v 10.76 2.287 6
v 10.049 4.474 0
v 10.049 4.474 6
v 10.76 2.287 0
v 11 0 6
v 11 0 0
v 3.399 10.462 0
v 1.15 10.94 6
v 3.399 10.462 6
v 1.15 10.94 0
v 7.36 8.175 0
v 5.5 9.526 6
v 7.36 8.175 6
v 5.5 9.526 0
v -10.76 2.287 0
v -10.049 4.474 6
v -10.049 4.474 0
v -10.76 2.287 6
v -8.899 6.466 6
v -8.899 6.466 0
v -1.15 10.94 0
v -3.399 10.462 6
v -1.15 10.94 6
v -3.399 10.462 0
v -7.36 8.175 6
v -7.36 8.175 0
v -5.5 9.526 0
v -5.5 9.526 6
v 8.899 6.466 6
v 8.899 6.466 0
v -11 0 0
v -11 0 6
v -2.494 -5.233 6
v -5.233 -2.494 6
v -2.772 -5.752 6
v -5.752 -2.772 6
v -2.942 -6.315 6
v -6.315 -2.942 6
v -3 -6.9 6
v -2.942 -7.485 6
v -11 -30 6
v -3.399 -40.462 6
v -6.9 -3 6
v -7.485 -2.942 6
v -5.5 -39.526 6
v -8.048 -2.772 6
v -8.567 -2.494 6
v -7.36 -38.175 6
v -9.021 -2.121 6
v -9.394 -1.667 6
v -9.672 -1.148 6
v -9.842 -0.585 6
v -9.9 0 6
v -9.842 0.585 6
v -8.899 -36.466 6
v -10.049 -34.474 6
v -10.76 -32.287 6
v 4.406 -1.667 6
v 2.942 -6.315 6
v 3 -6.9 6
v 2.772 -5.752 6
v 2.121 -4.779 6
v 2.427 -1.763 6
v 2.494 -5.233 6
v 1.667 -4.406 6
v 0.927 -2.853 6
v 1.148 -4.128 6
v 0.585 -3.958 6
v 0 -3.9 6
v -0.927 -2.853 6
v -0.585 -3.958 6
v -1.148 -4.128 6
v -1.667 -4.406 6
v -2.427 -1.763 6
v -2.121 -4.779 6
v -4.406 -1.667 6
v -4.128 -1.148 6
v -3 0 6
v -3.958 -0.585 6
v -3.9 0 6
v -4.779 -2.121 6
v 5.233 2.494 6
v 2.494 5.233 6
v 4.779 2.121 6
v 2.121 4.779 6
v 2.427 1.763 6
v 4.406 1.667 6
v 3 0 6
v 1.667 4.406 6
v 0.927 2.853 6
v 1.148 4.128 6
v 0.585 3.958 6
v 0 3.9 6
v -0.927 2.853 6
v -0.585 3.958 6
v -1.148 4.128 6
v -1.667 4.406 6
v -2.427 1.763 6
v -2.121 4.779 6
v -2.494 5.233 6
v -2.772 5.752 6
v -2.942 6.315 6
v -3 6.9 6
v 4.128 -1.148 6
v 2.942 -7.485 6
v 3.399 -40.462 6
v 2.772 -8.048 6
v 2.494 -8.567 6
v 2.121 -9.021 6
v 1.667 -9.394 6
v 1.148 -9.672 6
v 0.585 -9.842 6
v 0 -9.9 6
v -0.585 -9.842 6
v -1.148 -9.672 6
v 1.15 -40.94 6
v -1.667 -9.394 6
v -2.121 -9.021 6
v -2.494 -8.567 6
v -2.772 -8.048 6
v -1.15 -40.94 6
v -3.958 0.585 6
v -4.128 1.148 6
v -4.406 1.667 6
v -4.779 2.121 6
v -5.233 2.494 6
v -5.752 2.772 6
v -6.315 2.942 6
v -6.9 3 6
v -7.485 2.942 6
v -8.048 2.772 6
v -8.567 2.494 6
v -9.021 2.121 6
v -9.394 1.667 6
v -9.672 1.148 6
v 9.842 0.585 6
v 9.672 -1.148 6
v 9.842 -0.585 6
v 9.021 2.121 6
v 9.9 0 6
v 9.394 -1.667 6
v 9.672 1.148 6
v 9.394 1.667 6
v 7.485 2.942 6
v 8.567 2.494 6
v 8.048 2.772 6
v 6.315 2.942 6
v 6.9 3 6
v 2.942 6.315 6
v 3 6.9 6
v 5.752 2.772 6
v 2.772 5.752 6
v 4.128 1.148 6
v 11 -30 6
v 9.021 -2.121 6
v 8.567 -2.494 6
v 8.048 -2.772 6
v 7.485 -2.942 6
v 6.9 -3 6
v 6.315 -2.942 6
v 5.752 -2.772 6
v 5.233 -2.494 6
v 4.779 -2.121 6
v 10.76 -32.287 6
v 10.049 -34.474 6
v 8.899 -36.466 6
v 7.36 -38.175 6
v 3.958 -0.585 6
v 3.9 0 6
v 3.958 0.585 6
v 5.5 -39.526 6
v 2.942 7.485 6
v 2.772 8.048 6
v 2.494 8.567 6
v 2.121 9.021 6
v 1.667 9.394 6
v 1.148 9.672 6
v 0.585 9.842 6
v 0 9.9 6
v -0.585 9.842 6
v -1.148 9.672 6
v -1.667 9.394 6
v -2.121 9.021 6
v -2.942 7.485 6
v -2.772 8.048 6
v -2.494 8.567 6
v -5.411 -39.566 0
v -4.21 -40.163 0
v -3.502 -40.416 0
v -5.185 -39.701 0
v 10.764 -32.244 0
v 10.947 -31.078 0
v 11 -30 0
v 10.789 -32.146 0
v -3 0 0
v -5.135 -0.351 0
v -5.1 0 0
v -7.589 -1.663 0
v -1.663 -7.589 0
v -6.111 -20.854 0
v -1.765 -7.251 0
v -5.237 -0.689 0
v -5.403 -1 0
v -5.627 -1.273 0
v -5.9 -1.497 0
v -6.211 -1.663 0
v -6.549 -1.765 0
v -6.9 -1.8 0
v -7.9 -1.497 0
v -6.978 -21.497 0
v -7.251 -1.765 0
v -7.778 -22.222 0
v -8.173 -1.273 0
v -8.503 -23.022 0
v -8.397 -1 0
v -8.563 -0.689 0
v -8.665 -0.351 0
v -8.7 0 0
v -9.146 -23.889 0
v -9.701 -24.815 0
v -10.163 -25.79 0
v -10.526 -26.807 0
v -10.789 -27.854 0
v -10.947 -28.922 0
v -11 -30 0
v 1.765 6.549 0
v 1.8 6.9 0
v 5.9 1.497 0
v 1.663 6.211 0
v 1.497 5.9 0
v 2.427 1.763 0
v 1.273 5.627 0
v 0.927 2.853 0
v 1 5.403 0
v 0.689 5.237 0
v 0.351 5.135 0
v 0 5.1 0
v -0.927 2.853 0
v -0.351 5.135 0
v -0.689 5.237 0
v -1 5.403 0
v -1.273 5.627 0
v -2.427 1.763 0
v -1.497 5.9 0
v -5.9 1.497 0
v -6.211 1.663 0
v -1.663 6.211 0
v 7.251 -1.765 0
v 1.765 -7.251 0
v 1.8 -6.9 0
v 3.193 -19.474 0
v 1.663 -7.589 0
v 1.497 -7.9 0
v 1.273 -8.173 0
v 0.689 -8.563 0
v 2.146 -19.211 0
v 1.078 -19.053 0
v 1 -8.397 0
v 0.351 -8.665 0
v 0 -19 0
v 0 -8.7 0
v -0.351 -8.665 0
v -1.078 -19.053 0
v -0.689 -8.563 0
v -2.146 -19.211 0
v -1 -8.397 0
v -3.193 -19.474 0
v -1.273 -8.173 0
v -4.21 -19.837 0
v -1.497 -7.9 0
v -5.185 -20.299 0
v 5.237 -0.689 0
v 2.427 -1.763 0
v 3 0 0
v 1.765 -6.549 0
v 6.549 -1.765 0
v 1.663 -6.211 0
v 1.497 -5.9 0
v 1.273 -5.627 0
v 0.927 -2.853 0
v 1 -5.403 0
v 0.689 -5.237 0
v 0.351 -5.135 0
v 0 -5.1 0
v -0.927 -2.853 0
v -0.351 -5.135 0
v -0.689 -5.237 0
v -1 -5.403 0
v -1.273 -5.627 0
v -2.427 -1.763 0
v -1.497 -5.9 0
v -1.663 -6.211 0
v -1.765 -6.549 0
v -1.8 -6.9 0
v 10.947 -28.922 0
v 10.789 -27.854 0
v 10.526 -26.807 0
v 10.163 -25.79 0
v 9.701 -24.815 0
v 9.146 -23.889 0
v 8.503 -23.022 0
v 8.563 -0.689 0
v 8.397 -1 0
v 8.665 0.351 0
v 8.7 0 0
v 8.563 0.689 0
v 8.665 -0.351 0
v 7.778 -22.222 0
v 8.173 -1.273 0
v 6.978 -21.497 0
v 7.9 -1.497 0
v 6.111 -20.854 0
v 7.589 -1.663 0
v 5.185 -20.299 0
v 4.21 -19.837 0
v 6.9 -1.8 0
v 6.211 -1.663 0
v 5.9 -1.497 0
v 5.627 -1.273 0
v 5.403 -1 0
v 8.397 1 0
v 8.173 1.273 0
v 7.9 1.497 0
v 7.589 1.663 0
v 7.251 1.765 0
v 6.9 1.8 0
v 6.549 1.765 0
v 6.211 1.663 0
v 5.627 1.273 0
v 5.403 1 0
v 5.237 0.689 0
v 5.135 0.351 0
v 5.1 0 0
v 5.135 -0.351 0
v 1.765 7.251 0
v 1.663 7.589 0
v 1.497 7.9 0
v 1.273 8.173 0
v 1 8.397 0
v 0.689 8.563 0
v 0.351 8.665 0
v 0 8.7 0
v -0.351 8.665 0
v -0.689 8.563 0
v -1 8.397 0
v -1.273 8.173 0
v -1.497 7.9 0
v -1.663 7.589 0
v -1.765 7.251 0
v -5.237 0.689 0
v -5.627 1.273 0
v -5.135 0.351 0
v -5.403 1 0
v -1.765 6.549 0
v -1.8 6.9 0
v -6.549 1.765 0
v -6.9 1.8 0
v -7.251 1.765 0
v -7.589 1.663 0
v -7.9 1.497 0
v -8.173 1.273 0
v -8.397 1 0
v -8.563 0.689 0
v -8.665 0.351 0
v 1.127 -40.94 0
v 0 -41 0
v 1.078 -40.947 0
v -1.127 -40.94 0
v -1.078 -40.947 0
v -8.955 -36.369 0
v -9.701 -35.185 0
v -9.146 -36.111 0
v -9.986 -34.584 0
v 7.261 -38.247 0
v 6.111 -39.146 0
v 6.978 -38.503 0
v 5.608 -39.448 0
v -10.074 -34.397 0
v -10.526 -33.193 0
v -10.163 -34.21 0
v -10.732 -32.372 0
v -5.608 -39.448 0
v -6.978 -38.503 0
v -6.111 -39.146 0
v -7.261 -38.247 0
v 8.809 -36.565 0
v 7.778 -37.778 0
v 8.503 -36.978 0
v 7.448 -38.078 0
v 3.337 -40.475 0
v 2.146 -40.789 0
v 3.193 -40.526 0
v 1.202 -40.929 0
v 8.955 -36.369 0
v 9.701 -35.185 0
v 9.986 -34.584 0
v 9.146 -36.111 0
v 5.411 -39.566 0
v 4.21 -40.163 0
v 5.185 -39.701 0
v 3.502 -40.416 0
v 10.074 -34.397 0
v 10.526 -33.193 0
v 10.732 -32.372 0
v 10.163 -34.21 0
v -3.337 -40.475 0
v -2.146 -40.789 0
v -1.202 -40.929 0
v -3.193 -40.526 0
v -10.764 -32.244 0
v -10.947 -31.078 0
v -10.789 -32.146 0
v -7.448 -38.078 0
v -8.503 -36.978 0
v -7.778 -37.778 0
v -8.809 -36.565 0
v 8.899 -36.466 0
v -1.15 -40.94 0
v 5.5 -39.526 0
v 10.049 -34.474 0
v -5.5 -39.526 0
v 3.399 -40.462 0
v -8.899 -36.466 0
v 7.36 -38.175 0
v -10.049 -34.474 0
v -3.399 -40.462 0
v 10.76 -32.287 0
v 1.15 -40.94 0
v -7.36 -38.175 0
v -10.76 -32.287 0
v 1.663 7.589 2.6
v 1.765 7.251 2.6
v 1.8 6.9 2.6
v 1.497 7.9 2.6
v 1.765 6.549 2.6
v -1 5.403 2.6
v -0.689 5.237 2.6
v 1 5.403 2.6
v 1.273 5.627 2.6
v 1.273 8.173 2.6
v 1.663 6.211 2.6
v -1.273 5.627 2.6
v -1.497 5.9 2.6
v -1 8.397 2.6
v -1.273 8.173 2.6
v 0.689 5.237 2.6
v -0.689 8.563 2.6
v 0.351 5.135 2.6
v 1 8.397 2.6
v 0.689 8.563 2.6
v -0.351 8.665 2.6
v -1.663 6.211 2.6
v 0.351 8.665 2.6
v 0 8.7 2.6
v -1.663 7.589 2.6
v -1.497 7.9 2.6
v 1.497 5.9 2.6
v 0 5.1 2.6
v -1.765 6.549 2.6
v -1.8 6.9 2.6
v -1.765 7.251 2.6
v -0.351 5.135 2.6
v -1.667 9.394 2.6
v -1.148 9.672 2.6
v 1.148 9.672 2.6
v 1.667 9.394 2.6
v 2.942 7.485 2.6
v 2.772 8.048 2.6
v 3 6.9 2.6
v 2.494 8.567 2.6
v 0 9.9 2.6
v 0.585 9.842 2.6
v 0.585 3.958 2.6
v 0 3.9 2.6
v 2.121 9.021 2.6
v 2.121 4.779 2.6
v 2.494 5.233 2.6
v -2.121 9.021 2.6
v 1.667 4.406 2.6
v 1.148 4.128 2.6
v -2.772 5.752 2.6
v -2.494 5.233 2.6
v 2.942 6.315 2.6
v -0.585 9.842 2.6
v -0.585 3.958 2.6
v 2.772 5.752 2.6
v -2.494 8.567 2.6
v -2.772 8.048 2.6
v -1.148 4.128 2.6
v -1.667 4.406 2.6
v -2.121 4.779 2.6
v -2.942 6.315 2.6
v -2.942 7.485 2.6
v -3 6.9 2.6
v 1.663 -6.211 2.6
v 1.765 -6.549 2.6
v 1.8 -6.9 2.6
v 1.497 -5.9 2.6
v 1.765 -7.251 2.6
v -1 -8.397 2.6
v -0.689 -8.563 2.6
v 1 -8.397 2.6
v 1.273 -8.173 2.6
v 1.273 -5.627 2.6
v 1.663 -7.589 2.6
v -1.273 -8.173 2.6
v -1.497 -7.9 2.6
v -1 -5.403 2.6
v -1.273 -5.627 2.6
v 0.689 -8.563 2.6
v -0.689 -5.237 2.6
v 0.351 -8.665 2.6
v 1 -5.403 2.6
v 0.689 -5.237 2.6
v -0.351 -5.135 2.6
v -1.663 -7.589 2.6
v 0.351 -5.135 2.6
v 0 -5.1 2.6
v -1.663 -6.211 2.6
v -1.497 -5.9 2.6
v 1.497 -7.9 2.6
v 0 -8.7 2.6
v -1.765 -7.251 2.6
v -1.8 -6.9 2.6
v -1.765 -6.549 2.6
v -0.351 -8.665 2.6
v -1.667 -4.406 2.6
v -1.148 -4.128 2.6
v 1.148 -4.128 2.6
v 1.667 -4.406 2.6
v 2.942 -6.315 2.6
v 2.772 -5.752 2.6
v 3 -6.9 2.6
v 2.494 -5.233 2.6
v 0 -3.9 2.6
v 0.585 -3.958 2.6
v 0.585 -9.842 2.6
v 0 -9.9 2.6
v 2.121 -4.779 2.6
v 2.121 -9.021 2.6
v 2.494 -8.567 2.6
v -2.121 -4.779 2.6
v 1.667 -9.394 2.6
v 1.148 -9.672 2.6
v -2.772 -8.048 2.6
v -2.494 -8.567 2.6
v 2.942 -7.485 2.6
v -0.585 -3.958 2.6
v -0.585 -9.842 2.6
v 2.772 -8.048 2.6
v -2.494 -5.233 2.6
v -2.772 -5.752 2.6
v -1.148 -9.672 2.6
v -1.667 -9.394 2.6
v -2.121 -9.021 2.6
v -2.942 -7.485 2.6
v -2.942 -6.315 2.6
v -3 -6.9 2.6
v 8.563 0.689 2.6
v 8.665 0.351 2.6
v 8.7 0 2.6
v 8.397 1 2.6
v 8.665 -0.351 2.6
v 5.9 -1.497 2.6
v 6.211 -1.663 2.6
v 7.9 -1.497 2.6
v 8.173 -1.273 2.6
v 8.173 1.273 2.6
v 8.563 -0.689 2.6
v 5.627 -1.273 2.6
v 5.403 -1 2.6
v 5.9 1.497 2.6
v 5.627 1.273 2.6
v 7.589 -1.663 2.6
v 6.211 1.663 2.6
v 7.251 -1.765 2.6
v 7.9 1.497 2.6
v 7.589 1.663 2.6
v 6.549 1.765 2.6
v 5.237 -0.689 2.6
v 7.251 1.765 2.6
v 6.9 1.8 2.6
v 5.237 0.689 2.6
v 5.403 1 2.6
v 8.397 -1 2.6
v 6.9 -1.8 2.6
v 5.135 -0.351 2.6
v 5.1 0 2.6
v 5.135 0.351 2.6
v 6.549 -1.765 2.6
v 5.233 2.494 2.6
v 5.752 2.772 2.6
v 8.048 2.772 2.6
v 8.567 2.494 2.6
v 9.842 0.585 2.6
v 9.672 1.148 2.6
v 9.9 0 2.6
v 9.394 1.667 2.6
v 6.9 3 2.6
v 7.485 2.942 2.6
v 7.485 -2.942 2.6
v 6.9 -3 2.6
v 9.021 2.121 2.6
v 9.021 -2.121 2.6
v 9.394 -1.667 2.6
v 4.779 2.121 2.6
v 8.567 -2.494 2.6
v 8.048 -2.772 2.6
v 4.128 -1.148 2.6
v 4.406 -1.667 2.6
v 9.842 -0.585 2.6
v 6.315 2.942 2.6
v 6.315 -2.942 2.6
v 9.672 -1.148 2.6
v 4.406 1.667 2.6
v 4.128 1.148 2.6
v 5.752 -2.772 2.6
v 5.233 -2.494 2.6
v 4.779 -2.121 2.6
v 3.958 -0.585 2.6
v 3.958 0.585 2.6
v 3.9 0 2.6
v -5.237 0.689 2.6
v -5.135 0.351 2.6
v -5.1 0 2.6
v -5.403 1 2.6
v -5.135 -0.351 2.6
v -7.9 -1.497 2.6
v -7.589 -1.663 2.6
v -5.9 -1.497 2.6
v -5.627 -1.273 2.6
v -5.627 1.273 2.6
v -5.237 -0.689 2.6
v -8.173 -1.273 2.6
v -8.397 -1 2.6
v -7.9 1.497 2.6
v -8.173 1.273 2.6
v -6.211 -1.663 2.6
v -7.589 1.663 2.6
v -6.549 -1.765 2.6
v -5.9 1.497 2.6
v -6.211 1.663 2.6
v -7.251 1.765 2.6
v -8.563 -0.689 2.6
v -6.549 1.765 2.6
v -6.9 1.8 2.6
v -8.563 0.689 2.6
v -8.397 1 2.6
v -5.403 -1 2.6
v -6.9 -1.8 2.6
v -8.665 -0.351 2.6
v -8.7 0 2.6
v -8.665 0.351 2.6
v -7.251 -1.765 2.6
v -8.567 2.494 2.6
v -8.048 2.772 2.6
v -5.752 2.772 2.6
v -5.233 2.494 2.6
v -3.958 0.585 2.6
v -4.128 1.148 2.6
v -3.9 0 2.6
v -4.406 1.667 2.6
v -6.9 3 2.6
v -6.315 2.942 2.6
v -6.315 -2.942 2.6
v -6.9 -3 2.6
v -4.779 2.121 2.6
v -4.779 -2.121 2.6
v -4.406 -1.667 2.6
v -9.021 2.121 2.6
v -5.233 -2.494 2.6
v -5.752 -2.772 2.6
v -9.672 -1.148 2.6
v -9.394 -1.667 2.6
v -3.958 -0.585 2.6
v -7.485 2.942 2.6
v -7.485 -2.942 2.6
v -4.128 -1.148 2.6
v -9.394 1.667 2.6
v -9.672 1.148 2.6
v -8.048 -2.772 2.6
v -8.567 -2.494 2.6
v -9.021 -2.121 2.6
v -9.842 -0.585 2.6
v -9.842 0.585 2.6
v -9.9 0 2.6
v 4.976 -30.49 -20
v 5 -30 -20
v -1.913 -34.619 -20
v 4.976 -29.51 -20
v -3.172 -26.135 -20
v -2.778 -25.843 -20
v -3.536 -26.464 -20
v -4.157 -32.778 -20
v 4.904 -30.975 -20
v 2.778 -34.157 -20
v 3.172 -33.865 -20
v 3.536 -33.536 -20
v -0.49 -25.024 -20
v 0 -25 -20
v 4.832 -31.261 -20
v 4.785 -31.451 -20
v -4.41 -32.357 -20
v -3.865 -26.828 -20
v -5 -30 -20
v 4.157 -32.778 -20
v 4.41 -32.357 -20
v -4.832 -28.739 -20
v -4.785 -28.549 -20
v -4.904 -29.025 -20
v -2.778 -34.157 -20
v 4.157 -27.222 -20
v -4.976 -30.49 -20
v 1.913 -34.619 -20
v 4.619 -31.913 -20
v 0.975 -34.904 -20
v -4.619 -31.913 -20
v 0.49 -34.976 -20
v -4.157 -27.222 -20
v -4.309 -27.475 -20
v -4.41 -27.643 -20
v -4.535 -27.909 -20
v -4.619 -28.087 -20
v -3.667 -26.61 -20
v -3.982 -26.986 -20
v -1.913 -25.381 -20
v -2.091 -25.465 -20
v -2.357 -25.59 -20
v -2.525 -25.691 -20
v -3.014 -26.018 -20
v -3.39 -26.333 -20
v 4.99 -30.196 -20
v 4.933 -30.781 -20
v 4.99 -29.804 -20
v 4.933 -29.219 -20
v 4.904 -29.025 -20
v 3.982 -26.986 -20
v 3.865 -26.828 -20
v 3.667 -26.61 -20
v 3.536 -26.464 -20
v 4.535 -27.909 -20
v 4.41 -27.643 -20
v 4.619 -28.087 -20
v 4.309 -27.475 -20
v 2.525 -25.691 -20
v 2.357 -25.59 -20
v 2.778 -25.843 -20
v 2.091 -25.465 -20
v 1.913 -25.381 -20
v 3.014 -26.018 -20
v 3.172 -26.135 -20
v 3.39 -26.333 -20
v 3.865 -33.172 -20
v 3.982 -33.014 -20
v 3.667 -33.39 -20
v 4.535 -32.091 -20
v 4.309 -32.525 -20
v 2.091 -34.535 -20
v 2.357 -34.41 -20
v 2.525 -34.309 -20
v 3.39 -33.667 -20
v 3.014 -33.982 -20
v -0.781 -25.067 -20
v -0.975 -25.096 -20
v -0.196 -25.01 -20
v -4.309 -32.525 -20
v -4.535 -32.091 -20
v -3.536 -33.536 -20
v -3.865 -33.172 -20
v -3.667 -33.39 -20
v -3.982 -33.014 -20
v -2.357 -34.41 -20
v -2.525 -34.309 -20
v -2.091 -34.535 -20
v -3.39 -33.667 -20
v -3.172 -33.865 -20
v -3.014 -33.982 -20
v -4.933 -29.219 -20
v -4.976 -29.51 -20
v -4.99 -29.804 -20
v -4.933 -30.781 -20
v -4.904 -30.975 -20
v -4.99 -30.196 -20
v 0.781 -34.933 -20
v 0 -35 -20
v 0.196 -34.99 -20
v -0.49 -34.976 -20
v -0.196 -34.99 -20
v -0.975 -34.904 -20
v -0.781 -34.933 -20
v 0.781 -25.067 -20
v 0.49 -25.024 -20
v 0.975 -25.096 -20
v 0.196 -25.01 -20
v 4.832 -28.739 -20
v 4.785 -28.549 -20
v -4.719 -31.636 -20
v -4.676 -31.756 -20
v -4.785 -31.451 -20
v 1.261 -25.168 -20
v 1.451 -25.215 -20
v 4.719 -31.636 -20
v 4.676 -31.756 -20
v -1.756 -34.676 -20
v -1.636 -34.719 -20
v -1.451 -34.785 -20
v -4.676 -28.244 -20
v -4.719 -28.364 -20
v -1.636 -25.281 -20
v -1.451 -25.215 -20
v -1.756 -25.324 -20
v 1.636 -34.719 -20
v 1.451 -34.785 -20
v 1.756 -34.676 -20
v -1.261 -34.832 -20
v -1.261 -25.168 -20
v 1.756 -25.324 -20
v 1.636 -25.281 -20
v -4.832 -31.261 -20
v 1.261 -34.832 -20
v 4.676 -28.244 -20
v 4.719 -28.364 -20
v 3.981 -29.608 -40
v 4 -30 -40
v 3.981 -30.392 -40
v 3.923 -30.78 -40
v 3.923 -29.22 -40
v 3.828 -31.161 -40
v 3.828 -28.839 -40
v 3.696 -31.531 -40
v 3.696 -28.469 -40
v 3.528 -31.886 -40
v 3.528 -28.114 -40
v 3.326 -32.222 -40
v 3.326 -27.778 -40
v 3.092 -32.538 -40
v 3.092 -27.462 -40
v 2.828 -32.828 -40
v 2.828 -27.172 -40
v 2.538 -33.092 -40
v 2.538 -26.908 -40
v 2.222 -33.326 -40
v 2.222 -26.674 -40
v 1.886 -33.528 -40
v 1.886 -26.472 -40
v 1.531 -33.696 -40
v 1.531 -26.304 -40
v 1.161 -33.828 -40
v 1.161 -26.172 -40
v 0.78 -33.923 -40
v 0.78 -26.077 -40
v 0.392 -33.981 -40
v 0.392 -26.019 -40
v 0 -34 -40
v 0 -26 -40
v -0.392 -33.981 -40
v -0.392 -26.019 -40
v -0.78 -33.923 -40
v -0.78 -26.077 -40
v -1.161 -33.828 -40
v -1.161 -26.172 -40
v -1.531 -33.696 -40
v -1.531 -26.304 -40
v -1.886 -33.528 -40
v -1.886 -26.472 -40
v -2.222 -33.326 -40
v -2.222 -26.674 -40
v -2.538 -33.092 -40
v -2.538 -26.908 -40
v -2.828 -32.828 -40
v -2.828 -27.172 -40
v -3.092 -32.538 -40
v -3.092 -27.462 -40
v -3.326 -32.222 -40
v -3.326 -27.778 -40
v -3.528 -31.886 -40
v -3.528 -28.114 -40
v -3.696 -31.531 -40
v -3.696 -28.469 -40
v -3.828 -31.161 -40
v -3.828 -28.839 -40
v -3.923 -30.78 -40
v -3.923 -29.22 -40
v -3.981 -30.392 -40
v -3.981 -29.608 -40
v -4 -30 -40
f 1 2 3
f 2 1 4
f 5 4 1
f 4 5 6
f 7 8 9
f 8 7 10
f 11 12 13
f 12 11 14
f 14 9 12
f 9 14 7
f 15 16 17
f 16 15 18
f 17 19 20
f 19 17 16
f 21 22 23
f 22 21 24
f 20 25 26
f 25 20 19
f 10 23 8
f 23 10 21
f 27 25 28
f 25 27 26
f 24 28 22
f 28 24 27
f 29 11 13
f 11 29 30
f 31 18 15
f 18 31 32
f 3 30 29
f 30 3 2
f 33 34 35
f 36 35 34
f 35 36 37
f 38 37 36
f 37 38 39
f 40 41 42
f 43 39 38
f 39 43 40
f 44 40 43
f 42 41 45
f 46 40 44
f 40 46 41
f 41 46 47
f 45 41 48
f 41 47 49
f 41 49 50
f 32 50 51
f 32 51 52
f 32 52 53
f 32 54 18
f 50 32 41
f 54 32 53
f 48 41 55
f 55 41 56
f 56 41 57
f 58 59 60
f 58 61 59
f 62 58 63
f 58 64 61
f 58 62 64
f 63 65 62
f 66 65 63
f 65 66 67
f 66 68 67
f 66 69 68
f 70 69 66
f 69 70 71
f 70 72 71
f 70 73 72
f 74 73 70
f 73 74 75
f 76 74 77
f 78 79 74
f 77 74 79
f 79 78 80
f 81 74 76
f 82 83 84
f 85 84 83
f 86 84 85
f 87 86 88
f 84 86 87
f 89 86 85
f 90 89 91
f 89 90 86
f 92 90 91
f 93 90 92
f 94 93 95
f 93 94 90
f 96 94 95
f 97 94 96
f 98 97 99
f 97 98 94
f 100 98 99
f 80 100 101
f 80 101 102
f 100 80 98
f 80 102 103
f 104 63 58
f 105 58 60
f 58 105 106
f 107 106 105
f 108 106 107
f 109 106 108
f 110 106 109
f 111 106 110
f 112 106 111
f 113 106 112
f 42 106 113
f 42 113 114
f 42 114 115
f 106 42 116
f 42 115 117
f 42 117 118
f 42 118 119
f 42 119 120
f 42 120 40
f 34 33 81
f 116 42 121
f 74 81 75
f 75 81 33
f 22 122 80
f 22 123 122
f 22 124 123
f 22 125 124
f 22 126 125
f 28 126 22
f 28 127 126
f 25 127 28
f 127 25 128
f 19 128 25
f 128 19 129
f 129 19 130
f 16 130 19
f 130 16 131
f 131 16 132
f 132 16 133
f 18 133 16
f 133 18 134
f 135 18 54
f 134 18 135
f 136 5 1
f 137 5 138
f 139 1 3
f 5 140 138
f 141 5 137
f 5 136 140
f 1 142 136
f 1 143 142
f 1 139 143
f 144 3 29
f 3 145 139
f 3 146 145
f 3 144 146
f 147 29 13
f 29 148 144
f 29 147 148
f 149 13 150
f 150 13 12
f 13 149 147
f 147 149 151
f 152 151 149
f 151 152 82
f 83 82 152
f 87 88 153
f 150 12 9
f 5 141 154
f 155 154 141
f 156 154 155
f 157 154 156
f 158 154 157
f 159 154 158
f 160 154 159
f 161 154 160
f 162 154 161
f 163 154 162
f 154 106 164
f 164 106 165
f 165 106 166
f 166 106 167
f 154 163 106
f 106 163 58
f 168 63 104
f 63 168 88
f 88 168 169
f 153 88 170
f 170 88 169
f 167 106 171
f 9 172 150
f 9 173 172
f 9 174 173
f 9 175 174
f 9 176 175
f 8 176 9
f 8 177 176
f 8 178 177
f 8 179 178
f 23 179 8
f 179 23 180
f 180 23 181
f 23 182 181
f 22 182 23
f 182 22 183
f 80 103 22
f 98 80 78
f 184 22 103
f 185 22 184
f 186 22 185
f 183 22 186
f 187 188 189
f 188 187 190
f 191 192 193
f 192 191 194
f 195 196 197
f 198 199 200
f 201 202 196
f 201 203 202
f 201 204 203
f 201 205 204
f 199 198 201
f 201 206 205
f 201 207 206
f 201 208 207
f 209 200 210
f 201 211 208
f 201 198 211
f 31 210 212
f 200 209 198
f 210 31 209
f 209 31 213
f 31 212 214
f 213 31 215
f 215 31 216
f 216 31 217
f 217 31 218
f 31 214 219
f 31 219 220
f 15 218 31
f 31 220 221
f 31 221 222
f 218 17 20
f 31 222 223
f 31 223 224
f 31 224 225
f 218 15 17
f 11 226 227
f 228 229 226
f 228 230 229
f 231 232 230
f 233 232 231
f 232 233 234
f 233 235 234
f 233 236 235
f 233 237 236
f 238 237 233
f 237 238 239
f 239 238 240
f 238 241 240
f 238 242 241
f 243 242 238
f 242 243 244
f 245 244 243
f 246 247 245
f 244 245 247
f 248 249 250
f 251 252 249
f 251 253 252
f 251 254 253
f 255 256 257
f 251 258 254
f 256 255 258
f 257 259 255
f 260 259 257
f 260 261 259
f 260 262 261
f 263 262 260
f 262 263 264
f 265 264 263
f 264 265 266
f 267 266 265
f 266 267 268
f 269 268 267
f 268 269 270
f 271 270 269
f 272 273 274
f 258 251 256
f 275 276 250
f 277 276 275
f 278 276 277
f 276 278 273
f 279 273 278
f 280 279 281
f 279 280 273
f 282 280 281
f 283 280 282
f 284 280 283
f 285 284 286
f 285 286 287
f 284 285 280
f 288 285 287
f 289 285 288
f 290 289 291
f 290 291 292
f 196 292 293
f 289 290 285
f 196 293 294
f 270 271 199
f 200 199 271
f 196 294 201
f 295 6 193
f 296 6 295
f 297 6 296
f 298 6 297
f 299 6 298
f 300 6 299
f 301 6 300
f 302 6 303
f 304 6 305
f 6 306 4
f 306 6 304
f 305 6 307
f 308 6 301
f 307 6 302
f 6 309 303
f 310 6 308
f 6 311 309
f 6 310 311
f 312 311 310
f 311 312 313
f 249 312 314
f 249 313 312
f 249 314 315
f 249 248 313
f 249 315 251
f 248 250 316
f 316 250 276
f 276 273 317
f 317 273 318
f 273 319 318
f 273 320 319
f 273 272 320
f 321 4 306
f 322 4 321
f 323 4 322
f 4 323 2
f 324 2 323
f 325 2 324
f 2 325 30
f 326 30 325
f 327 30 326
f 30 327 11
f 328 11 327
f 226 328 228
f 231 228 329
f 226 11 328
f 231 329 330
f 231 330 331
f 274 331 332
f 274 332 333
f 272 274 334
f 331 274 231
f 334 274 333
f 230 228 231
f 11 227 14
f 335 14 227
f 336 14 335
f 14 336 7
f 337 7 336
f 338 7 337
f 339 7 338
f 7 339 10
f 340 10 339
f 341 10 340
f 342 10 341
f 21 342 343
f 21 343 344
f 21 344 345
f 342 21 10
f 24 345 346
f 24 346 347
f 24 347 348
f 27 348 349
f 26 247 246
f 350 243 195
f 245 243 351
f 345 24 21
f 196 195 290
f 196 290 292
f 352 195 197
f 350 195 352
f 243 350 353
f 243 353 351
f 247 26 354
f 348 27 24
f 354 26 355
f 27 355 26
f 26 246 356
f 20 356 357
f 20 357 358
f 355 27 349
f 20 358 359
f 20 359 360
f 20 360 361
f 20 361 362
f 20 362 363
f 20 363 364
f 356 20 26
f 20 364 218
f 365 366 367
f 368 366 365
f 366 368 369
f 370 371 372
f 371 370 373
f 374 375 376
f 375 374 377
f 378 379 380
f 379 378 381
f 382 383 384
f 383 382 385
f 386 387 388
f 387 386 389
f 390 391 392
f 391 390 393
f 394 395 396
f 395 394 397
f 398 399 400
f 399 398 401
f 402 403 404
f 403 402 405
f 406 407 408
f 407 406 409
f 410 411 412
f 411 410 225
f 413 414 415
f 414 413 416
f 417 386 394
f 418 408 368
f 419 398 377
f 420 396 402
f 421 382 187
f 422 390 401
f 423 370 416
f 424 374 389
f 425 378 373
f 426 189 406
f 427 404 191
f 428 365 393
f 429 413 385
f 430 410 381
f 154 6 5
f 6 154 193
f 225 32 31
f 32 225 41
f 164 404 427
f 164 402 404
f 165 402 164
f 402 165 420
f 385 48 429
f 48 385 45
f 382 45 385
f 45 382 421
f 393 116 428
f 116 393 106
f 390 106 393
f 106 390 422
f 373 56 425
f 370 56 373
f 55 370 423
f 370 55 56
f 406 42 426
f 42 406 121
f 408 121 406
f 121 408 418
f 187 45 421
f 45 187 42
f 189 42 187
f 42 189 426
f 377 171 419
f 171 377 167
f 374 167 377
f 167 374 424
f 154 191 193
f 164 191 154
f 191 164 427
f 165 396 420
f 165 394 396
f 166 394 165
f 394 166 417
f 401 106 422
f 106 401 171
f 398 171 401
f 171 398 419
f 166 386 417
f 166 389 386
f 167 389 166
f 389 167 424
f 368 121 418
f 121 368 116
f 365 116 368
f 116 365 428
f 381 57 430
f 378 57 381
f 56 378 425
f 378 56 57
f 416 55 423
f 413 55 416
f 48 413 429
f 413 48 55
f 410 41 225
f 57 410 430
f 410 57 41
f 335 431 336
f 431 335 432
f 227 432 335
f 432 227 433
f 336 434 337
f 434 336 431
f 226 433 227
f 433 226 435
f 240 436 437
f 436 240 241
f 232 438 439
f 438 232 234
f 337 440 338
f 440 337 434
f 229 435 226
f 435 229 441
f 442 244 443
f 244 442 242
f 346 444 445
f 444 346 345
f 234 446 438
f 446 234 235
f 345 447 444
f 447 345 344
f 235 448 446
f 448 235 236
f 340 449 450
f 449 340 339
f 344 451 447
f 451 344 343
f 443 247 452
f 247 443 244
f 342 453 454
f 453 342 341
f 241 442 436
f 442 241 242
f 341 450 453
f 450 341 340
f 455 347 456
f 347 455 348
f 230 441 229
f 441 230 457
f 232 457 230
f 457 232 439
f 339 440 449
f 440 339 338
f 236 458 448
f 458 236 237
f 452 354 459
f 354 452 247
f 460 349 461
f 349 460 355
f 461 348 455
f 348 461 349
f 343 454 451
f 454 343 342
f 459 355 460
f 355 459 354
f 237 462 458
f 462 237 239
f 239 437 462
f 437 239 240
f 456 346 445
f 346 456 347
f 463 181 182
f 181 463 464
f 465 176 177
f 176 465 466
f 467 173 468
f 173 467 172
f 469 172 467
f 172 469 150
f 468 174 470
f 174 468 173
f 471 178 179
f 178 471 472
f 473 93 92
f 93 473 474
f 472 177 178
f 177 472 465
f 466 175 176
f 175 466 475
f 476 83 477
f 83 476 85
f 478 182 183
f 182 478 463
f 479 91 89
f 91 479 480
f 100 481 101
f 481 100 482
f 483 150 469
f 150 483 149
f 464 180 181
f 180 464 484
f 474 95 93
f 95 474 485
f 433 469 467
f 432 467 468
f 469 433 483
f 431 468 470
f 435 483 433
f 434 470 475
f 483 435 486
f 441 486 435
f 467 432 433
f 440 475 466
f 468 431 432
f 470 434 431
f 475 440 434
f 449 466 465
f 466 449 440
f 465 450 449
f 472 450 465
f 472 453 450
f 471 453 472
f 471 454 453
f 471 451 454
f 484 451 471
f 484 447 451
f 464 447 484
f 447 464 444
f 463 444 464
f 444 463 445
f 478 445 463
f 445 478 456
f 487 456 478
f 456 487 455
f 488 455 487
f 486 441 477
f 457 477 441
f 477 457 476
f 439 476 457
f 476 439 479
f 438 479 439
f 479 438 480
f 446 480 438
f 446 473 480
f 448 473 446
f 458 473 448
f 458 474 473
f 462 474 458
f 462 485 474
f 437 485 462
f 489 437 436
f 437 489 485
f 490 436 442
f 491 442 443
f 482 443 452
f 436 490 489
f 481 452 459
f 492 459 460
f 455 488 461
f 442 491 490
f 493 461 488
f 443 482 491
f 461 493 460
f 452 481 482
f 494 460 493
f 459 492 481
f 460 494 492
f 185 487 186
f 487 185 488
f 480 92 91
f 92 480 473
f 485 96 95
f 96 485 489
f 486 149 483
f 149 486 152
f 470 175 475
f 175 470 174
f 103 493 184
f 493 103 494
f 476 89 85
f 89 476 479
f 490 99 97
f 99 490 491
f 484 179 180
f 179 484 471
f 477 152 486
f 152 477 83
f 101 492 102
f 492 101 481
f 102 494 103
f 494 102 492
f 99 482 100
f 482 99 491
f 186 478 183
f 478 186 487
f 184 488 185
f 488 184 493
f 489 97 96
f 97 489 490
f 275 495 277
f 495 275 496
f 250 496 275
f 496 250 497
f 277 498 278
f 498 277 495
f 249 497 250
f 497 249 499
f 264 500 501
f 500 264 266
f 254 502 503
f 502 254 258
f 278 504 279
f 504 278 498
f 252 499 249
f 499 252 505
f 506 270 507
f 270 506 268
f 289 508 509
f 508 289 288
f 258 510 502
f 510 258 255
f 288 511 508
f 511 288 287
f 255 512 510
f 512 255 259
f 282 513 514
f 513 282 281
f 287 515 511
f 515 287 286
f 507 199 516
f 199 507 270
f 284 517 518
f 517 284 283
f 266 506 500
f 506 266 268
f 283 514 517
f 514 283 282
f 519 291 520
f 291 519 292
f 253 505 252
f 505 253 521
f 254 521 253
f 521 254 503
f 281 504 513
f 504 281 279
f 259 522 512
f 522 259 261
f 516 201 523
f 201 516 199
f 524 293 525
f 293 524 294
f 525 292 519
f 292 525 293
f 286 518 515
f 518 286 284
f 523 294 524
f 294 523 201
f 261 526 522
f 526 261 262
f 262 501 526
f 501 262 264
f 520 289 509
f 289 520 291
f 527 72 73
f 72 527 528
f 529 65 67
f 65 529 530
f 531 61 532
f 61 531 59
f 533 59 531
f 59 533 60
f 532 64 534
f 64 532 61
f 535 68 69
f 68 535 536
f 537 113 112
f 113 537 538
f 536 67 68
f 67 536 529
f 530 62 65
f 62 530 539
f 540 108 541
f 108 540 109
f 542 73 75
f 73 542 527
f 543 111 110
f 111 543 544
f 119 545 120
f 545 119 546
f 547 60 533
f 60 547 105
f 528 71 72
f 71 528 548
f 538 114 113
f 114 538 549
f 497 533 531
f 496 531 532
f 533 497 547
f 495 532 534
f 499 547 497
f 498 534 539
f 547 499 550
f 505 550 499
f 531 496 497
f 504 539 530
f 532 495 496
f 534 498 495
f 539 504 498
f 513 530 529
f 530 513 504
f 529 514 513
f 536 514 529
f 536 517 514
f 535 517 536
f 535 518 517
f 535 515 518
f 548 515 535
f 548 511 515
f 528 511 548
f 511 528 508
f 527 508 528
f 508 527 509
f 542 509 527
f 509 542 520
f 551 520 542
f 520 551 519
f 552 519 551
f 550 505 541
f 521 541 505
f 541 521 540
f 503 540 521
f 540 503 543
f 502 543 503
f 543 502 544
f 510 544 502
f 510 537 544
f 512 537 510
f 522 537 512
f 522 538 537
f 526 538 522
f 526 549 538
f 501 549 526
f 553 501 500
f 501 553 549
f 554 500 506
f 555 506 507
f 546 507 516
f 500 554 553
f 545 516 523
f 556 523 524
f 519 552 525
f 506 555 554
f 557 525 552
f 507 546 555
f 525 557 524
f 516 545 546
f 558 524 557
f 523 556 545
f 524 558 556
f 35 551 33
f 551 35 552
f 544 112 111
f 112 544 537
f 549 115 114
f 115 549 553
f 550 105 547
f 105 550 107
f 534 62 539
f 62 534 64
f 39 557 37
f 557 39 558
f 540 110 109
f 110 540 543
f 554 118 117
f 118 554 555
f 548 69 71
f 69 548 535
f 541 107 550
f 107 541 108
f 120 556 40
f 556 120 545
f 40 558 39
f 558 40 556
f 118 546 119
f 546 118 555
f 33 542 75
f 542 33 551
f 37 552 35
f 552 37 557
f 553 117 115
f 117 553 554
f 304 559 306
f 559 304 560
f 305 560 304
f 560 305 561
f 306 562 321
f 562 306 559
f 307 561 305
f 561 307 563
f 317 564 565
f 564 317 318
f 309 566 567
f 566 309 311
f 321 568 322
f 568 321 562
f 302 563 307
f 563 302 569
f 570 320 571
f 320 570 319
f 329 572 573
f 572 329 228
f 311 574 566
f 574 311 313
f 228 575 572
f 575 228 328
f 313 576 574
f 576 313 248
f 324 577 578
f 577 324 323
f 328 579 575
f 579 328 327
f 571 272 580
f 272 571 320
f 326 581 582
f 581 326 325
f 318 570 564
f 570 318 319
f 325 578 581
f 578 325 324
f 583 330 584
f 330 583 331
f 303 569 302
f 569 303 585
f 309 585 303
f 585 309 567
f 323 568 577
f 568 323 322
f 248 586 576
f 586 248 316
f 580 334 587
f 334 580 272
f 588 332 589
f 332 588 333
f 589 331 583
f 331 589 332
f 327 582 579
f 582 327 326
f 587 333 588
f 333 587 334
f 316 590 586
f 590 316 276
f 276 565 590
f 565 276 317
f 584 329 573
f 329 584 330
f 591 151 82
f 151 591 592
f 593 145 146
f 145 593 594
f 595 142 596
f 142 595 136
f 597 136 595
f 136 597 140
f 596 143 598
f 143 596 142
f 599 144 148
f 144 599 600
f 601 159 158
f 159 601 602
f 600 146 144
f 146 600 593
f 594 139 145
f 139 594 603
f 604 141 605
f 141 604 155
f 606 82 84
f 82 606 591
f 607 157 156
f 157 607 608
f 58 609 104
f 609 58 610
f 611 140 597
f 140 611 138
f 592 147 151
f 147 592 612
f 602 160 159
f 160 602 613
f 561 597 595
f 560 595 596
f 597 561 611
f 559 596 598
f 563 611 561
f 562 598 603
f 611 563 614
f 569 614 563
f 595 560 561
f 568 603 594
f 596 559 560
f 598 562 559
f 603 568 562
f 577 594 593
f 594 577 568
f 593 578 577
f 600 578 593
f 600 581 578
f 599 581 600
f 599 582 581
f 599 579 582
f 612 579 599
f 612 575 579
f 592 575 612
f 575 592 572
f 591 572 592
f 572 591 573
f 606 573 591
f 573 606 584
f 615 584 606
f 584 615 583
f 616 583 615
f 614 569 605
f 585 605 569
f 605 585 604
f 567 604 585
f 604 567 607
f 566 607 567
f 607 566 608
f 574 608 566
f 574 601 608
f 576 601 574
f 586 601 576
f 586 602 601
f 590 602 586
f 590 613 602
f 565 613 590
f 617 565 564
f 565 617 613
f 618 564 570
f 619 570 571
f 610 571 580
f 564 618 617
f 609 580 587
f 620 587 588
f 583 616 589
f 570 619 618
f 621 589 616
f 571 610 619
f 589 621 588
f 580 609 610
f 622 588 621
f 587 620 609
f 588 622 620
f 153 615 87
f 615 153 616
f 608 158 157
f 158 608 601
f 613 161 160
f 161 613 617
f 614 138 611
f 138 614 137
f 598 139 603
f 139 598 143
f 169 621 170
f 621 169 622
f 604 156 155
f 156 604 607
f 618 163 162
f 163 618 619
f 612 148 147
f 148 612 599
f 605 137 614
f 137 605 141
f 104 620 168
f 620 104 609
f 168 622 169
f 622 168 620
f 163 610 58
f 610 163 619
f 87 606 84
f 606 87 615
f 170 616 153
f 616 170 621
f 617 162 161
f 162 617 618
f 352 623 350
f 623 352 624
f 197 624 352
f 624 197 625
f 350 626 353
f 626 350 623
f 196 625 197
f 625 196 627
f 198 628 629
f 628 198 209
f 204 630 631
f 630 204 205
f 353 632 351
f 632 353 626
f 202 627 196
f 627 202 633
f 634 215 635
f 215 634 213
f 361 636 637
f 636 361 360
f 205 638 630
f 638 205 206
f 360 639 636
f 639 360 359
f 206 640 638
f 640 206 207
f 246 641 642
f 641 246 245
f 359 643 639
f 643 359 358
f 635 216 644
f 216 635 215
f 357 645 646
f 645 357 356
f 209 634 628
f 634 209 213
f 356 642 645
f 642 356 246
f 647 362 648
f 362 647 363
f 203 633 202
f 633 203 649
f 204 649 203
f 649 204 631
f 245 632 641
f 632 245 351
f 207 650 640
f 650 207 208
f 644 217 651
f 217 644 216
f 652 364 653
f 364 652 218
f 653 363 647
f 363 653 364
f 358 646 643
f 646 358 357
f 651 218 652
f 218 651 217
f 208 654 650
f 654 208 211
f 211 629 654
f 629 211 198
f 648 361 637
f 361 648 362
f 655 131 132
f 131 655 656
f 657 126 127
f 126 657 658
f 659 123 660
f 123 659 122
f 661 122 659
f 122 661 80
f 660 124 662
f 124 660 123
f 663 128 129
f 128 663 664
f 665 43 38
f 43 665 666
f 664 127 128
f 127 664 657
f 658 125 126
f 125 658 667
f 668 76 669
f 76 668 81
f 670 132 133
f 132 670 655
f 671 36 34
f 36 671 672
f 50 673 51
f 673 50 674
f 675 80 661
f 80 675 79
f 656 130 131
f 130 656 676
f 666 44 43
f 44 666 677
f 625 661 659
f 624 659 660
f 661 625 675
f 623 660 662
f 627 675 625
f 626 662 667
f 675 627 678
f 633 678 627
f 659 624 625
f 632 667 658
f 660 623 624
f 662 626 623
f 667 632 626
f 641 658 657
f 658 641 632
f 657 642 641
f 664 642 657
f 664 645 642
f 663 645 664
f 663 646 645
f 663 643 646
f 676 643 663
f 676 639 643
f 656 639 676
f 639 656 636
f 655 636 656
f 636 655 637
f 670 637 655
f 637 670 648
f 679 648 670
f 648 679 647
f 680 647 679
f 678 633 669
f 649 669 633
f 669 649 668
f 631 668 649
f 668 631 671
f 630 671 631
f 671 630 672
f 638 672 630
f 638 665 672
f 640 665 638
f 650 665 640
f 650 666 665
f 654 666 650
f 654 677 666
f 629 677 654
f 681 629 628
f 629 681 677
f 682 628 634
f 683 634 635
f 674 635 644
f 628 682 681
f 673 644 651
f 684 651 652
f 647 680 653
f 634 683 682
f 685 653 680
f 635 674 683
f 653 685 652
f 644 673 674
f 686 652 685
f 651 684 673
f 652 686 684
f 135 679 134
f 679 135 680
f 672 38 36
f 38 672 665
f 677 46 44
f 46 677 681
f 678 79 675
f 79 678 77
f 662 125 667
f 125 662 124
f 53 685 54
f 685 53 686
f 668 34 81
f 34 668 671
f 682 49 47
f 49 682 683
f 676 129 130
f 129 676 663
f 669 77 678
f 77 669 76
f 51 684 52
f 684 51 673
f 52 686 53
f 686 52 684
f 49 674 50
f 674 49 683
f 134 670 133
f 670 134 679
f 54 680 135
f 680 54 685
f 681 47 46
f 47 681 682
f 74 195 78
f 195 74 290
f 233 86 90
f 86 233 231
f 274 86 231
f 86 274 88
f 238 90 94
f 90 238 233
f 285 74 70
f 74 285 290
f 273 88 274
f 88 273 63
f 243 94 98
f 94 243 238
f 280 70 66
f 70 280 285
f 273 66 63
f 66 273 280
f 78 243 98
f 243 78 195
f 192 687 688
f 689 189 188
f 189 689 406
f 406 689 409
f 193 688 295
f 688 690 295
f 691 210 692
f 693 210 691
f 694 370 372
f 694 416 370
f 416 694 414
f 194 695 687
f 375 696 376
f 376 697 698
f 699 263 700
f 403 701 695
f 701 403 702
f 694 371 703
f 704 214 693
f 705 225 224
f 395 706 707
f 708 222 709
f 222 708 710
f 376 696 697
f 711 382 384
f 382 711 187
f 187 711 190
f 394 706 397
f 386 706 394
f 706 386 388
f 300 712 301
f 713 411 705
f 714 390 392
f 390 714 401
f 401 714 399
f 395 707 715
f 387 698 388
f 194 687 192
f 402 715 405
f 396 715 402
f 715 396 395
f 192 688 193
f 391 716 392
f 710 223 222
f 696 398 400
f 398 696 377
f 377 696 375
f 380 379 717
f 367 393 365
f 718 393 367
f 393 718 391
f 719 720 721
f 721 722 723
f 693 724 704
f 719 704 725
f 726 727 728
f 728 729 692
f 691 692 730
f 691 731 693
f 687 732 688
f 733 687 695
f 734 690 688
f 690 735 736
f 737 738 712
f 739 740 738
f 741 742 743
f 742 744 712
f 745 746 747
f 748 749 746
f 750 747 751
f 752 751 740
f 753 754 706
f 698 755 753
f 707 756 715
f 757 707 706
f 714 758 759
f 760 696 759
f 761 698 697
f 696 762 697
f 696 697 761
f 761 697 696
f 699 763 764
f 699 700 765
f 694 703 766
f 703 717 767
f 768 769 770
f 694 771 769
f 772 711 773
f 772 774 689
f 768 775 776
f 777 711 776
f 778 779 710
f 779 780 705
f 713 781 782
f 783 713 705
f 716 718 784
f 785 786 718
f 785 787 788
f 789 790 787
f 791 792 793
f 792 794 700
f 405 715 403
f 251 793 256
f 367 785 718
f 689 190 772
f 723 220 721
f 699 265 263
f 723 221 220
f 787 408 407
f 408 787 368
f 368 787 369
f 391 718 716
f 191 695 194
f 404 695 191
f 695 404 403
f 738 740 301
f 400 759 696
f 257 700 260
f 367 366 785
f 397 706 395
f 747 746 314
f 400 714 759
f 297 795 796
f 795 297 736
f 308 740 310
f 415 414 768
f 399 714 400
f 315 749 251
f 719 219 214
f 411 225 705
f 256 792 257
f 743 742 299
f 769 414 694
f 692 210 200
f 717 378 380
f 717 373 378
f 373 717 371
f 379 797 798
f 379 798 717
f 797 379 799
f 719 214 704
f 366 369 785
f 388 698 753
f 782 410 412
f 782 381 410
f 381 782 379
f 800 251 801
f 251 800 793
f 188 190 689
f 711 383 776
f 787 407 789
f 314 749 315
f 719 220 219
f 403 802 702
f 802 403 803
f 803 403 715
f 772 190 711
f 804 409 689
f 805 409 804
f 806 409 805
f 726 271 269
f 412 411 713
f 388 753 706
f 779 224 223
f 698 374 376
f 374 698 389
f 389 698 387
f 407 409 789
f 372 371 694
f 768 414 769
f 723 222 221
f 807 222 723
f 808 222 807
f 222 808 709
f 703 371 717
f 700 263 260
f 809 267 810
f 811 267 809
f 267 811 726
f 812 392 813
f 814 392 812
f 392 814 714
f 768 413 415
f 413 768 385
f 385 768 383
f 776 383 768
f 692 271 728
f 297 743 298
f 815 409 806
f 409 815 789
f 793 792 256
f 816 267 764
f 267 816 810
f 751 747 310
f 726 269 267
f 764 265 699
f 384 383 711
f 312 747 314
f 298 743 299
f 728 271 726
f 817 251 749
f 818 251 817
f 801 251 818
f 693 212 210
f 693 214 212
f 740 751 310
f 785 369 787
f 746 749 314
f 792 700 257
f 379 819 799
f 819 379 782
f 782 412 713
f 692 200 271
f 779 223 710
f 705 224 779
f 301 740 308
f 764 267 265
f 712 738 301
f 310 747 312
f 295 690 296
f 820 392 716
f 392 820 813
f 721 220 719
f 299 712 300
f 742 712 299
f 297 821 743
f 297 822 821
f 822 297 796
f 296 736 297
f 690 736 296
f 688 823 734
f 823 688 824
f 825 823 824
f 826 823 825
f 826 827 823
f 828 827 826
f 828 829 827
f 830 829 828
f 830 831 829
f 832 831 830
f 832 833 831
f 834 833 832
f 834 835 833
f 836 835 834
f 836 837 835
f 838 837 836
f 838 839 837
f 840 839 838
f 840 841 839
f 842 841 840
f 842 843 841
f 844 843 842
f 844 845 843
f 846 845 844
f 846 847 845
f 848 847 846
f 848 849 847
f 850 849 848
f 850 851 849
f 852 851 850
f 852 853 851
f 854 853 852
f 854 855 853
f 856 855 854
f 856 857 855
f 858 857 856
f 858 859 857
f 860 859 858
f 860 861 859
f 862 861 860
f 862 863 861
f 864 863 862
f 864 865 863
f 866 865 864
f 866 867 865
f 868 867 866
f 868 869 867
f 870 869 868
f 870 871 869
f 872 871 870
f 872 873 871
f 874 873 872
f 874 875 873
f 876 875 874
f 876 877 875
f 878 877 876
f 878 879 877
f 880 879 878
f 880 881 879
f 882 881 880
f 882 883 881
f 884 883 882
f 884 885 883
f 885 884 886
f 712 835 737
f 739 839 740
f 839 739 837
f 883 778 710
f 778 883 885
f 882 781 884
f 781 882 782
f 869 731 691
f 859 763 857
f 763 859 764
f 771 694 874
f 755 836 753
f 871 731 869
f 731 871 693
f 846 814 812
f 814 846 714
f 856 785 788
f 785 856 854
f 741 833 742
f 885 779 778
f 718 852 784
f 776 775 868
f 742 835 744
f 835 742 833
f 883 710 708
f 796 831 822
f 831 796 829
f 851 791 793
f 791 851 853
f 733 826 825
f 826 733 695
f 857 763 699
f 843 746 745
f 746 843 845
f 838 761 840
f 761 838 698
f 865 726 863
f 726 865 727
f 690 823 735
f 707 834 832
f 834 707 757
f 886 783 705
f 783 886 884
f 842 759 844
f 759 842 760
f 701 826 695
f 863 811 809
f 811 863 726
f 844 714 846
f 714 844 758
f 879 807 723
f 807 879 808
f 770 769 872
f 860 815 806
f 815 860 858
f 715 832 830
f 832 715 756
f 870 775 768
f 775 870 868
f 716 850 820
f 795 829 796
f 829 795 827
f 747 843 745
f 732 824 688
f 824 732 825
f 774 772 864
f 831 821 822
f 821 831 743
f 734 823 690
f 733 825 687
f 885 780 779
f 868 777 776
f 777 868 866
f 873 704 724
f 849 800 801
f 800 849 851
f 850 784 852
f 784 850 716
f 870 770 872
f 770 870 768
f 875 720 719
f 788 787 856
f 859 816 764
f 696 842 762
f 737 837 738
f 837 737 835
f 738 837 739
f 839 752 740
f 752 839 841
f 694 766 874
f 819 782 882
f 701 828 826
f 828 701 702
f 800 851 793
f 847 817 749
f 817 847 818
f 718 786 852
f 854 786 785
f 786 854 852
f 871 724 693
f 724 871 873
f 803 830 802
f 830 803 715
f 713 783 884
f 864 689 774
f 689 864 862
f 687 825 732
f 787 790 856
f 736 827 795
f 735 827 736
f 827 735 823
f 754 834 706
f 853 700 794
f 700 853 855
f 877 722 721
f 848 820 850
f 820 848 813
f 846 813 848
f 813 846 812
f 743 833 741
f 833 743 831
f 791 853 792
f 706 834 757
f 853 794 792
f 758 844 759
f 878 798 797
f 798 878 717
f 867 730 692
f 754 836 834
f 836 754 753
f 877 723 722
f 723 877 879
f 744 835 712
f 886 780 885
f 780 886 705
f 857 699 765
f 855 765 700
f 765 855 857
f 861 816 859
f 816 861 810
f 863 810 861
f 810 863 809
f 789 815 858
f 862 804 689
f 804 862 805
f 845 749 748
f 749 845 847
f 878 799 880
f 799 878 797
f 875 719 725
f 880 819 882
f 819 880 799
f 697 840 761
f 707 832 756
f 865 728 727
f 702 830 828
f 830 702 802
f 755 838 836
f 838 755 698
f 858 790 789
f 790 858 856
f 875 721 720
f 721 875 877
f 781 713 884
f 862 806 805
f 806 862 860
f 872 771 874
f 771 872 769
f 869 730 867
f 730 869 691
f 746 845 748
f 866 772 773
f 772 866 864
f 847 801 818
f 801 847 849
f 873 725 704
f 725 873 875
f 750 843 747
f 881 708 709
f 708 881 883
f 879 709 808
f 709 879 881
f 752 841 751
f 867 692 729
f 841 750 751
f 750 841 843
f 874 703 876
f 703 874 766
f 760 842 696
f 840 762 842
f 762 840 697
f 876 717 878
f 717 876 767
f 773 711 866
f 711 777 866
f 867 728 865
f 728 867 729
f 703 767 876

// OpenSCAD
plate_radius = 11;
plate_thickness = 6;
chuck_height = 22;
chuck_radius = 4.2;
chuck_base_radius = 7.4;  // Wider base for the cone
screw_hole_radius = 1.8;
countersink_radius = 3;
// screw_hole_offset = 6.44;
screw_hole_offset = 6.9;
top_cylinder_height = chuck_height + 2;  // Height of cylinders above screw holes
top_cylinder_radius = 2.8;  // Radius of cylinders above screw holes

module plat_screw_hole() {
    cylinder(h=plate_thickness, r=screw_hole_radius, $fn=32);
    translate([0, 0, 3.6]) {
        cylinder(r=countersink_radius, h=10, $fn=32);
    }
}

module magnet_cavity() {
    cylinder(h=10, r=3.4);
}

module plate() {
    cylinder(h=plate_thickness, r=plate_radius);
    translate([-11, -30, 0]) {
        cube([22, 30, 6]);
    }
    translate([0, -30, 0]) {
        cylinder(h=plate_thickness, r=plate_radius);
    }
}

module main() {
    difference() {
    plate();
    
    translate([0, 0, -1]) {
        cylinder(r=3, h=10);
    }
    
    // Screw holes with cylinders above them
    translate([0, screw_hole_offset, -1]) {
        plat_screw_hole();
    }
    
    translate([0, -screw_hole_offset, -1]) {
        plat_screw_hole();
    }

    translate([screw_hole_offset, 0, -1]) {
        plat_screw_hole();
    }
    
    translate([-screw_hole_offset, 0, -1]) {
            plat_screw_hole();
        }
    }
    
    // cylinder(h = 6, r = 10, $fn = 64);
    translate([0, -30, 0]) {
        translate([0, 0, -20]) {
            cylinder(h = 20, r = 5, r2 = 11, $fn = 64);
        }
        translate([0, 0, -40]) {
            cylinder(h = 40, r = 4, r2 = 6, $fn = 64);
        }
    }
}

main();
